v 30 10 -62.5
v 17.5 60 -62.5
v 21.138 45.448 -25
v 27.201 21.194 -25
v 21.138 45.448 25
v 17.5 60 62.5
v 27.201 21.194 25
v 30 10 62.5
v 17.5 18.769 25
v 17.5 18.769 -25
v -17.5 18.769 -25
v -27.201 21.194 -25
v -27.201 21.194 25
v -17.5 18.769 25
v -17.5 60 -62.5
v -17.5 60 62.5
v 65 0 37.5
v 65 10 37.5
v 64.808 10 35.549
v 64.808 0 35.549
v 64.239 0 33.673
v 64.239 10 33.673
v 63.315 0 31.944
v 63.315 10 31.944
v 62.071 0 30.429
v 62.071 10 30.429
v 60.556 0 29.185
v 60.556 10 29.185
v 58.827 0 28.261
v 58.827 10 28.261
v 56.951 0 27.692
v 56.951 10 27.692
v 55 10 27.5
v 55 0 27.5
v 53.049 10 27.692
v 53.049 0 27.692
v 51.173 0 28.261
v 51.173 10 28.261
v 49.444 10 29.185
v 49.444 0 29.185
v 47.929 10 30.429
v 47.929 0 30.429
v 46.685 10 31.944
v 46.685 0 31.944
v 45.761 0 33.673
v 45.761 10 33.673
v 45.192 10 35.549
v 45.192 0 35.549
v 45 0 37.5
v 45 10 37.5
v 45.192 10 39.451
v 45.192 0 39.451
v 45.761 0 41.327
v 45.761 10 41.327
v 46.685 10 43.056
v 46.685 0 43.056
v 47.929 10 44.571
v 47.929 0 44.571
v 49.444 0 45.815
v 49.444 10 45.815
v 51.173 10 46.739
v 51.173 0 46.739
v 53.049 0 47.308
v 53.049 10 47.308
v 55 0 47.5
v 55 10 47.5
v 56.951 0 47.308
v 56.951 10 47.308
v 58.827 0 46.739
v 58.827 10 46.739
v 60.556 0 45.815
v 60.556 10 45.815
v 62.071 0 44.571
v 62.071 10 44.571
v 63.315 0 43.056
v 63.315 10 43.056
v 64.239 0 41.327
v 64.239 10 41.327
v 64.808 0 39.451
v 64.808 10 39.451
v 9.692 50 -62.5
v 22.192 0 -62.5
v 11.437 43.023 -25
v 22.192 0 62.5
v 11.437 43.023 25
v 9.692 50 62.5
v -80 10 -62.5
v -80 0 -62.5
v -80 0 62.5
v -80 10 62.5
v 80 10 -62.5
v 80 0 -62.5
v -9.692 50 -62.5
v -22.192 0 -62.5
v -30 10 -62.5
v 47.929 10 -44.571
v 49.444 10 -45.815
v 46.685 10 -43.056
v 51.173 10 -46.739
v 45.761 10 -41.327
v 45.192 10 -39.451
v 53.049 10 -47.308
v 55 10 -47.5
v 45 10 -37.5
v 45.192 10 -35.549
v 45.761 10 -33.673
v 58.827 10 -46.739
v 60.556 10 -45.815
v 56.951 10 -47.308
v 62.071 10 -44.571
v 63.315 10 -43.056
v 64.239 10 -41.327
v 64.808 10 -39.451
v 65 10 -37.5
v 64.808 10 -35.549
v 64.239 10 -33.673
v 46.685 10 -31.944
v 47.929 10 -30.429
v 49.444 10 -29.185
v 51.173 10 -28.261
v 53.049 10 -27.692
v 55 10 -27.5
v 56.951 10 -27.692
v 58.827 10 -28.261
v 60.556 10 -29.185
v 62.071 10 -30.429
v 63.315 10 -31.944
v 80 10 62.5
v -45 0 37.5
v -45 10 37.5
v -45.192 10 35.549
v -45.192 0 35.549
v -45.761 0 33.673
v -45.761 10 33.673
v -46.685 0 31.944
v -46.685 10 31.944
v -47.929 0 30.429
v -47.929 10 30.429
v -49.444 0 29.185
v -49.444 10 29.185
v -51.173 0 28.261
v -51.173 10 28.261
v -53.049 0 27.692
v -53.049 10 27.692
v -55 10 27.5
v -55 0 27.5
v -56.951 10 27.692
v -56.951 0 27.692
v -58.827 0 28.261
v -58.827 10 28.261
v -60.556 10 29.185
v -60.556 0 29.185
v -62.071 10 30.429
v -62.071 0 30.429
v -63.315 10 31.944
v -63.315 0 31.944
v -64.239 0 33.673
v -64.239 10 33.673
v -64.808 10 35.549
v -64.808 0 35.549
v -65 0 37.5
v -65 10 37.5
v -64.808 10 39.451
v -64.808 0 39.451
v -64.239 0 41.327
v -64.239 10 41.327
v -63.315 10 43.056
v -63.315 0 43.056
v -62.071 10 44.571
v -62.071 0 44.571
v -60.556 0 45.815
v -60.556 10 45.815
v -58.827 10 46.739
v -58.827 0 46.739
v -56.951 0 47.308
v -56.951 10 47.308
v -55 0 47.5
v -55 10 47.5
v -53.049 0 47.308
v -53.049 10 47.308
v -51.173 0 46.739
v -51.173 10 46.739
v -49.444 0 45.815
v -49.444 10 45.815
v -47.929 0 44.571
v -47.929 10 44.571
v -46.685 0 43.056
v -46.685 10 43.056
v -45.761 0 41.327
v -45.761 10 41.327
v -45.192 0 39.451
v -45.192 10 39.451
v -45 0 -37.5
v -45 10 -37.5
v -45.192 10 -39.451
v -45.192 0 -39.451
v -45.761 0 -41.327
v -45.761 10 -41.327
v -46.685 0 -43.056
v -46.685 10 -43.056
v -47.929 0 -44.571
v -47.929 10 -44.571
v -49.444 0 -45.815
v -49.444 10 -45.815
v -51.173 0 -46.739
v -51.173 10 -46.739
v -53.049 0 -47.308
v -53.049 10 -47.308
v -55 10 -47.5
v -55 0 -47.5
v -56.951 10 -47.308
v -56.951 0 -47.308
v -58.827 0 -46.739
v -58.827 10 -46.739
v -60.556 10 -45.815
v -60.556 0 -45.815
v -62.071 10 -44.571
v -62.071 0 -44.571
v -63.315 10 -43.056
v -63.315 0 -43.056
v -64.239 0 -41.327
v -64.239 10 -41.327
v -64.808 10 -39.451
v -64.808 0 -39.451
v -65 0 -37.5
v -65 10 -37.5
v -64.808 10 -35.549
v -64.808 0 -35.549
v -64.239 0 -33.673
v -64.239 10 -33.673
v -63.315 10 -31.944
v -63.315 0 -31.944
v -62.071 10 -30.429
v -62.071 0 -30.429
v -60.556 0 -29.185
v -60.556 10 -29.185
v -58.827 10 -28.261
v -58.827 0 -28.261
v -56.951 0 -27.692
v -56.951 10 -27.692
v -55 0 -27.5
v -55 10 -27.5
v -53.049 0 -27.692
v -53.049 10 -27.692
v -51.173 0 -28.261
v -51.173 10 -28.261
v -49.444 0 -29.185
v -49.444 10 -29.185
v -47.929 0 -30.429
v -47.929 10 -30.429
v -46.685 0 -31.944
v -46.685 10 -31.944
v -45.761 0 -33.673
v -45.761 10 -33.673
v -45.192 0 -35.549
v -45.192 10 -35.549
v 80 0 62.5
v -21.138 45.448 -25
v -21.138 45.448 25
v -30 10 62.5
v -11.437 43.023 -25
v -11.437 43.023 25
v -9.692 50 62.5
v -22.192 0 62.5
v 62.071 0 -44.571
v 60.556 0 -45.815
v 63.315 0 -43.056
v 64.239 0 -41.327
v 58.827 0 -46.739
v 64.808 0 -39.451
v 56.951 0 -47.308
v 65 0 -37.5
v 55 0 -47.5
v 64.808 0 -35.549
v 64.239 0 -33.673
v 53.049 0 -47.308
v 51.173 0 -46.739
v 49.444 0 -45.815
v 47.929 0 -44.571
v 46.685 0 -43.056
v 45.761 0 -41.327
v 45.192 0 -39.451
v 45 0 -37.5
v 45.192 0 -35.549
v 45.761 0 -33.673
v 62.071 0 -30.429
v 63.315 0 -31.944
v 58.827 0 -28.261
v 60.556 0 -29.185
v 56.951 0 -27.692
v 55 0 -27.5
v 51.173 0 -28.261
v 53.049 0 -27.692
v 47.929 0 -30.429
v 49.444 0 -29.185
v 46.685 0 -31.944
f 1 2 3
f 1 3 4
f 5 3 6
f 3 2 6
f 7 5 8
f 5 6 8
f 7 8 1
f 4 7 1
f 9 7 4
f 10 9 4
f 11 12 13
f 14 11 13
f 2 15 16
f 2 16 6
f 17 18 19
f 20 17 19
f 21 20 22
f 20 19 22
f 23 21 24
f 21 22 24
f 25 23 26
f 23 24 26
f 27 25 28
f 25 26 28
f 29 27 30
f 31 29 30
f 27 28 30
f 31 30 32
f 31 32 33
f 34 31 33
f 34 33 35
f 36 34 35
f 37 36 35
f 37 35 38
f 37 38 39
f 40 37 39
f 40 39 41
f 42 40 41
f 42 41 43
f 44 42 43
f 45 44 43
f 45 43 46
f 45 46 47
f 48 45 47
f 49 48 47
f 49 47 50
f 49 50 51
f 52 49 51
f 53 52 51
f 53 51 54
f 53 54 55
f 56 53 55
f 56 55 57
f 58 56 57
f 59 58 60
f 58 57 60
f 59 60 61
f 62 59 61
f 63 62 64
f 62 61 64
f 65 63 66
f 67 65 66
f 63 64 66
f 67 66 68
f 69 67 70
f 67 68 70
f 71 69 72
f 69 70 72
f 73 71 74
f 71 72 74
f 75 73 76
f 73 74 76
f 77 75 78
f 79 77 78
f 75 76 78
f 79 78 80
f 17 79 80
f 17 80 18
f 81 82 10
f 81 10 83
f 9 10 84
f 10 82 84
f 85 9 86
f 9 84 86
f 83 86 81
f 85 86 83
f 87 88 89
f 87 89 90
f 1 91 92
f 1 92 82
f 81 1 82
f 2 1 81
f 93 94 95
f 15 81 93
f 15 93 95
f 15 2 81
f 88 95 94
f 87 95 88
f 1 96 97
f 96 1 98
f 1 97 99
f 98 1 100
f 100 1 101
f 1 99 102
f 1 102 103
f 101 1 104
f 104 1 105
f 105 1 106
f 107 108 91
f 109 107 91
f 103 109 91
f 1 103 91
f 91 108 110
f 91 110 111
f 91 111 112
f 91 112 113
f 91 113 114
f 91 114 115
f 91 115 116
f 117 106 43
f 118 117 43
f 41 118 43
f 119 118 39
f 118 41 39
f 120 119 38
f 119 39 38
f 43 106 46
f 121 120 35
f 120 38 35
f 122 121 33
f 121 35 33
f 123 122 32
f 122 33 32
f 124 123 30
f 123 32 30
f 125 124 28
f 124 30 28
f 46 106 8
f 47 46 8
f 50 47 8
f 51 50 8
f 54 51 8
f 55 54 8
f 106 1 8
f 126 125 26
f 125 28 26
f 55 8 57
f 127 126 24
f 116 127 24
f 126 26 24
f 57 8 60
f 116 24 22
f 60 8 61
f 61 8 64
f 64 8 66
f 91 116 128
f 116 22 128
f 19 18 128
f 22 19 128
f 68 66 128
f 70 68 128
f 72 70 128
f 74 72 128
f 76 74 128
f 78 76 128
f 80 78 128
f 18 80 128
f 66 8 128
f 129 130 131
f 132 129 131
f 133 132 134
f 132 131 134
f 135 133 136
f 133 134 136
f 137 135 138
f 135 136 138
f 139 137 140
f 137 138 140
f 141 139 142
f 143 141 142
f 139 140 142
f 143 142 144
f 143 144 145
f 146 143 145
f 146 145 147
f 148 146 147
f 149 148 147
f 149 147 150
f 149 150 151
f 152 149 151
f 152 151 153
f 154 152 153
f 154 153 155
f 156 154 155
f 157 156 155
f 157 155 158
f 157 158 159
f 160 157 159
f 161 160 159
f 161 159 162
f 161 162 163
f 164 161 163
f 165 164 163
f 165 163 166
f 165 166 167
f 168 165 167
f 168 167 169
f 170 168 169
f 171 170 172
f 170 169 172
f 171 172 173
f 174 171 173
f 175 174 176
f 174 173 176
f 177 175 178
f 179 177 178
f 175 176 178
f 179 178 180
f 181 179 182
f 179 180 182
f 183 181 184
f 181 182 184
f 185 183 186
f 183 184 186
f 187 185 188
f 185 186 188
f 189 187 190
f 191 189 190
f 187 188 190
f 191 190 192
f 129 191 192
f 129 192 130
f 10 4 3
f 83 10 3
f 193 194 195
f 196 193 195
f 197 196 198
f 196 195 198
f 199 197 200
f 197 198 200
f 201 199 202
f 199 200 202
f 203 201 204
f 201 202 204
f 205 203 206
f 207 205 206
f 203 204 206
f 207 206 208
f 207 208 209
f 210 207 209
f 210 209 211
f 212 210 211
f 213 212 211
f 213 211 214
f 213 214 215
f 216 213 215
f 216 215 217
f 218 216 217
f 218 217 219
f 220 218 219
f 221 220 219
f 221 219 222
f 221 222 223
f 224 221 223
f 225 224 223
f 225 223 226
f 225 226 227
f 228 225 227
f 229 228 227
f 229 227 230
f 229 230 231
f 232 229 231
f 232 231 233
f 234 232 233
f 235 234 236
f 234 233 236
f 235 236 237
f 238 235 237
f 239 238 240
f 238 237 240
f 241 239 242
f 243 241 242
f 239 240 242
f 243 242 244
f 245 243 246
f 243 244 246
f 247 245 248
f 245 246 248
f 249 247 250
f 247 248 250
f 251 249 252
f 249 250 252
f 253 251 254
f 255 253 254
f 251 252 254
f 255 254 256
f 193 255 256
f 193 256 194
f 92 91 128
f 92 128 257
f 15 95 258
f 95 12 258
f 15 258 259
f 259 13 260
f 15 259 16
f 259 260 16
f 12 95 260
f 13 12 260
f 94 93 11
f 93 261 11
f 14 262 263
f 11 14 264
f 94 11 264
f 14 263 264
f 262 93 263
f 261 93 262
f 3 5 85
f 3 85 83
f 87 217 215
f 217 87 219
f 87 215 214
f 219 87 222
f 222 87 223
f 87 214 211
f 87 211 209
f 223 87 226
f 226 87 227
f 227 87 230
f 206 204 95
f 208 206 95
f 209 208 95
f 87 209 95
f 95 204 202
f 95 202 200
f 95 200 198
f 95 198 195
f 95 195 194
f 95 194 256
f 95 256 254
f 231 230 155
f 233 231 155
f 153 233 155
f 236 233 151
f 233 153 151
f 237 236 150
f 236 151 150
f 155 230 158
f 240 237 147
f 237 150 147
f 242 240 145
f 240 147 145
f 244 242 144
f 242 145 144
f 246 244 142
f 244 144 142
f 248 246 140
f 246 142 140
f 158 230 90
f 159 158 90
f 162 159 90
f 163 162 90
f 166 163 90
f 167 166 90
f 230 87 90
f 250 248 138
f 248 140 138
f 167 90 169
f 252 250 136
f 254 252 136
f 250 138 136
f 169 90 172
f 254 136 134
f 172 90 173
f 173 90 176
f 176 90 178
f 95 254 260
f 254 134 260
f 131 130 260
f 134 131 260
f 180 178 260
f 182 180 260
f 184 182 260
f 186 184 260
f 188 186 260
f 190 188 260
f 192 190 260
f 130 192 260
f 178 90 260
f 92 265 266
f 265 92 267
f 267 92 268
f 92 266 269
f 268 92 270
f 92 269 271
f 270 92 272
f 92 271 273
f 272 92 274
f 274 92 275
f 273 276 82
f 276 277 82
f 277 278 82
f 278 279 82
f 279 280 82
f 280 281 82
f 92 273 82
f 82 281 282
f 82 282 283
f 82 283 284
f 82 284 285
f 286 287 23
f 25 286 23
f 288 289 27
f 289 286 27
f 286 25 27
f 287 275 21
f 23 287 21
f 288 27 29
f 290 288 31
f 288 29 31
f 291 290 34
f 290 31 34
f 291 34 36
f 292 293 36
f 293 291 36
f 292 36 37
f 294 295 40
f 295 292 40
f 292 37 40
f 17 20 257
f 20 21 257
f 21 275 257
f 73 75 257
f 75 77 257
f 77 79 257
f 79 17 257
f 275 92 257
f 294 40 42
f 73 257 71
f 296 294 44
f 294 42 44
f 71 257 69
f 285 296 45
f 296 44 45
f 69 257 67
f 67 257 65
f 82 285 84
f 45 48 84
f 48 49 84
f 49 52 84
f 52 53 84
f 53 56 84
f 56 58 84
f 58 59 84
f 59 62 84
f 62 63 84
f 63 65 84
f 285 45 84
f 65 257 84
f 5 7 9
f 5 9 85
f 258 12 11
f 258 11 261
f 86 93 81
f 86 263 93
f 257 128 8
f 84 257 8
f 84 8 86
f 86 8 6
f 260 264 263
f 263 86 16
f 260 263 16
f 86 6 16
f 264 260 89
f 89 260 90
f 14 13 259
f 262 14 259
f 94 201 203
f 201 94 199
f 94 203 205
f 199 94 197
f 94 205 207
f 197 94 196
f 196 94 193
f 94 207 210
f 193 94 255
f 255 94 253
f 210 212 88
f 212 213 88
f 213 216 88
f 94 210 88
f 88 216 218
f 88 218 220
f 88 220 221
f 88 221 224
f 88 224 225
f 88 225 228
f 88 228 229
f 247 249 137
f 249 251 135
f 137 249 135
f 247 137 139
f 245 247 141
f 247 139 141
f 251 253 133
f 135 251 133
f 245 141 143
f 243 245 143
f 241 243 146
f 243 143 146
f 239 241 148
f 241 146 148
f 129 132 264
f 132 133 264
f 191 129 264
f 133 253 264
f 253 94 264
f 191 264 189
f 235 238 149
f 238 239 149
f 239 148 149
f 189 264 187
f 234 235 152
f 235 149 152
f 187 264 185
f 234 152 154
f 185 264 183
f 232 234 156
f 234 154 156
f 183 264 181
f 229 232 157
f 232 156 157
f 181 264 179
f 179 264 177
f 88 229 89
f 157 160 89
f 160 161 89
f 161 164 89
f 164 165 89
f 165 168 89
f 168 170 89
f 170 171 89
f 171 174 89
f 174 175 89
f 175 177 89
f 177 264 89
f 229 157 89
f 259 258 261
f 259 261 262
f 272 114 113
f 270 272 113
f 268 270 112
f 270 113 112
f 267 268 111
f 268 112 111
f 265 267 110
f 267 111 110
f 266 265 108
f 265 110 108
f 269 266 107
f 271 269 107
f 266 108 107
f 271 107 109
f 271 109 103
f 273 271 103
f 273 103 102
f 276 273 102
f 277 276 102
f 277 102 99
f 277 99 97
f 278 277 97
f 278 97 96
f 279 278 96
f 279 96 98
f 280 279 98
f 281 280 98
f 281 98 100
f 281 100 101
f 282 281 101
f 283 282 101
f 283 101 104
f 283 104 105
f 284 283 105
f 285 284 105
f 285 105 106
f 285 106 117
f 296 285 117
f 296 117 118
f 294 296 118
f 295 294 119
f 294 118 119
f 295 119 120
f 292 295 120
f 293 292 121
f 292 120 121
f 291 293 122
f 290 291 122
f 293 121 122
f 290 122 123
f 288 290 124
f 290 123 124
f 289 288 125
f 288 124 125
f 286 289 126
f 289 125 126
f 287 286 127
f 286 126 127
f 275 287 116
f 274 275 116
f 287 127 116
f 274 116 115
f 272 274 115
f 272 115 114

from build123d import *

# Parameters (mm, degrees)
BOSS_EXTRUDE1_DEPTH = 62.5
SKETCH3_R           = 10
CUT_EXTRUDE1_DEPTH  = 125
SKETCH4_W           = 50
SKETCH4_H           = 25
CUT_EXTRUDE2_DEPTH  = 10
SKETCH5_W           = 50
SKETCH5_H           = 25
CUT_EXTRUDE3_DEPTH  = 10


with BuildPart() as part:
    # Sketch2 → Boss-Extrude1 (new body, symmetric)
    with BuildSketch(Plane.XY):
        Polygon((-17.5, 60), (17.5, 60), (30, 10), (80, 10), (80, 0), (22.192235936, 0), (9.692235936, 50), (0, 50), (-9.692235936, 50), (-22.192235936, 0), (-80, 0), (-80, 10), (-30, 10), align=None)
    extrude(amount=BOSS_EXTRUDE1_DEPTH, both=True)

    # Sketch3 → Cut-Extrude1 (cut)
    with BuildSketch(Plane(origin=(0, 10, 0), x_dir=(1, 0, 0), z_dir=(0, 1, 0))):
        with Locations((55, 37.5)):
            Circle(SKETCH3_R)
        with Locations((-55, 37.5)):
            Circle(SKETCH3_R)
        with Locations((-55, -37.5)):
            Circle(SKETCH3_R)
        with Locations((55, -37.5)):
            Circle(SKETCH3_R)
    extrude(amount=-CUT_EXTRUDE1_DEPTH, mode=Mode.SUBTRACT)

    # Sketch4 → Cut-Extrude2 (cut)
    with BuildSketch(Plane(origin=(30.588235294, 7.647058824, 0), x_dir=(0, 0, -1), z_dir=(0.9701425, 0.242535625, 0))):
        with Locations((0, 26.464176571)):
            Rectangle(SKETCH4_W, SKETCH4_H)
    extrude(amount=-CUT_EXTRUDE2_DEPTH, mode=Mode.SUBTRACT)

    # Sketch5 → Cut-Extrude3 (cut)
    with BuildSketch(Plane(origin=(-30.588235294, 7.647058824, 0), x_dir=(0, 0, 1), z_dir=(-0.9701425, 0.242535625, 0))):
        with Locations((0, 26.464176571)):
            Rectangle(SKETCH5_W, SKETCH5_H)
    extrude(amount=-CUT_EXTRUDE3_DEPTH, mode=Mode.SUBTRACT)


solid = part.part
